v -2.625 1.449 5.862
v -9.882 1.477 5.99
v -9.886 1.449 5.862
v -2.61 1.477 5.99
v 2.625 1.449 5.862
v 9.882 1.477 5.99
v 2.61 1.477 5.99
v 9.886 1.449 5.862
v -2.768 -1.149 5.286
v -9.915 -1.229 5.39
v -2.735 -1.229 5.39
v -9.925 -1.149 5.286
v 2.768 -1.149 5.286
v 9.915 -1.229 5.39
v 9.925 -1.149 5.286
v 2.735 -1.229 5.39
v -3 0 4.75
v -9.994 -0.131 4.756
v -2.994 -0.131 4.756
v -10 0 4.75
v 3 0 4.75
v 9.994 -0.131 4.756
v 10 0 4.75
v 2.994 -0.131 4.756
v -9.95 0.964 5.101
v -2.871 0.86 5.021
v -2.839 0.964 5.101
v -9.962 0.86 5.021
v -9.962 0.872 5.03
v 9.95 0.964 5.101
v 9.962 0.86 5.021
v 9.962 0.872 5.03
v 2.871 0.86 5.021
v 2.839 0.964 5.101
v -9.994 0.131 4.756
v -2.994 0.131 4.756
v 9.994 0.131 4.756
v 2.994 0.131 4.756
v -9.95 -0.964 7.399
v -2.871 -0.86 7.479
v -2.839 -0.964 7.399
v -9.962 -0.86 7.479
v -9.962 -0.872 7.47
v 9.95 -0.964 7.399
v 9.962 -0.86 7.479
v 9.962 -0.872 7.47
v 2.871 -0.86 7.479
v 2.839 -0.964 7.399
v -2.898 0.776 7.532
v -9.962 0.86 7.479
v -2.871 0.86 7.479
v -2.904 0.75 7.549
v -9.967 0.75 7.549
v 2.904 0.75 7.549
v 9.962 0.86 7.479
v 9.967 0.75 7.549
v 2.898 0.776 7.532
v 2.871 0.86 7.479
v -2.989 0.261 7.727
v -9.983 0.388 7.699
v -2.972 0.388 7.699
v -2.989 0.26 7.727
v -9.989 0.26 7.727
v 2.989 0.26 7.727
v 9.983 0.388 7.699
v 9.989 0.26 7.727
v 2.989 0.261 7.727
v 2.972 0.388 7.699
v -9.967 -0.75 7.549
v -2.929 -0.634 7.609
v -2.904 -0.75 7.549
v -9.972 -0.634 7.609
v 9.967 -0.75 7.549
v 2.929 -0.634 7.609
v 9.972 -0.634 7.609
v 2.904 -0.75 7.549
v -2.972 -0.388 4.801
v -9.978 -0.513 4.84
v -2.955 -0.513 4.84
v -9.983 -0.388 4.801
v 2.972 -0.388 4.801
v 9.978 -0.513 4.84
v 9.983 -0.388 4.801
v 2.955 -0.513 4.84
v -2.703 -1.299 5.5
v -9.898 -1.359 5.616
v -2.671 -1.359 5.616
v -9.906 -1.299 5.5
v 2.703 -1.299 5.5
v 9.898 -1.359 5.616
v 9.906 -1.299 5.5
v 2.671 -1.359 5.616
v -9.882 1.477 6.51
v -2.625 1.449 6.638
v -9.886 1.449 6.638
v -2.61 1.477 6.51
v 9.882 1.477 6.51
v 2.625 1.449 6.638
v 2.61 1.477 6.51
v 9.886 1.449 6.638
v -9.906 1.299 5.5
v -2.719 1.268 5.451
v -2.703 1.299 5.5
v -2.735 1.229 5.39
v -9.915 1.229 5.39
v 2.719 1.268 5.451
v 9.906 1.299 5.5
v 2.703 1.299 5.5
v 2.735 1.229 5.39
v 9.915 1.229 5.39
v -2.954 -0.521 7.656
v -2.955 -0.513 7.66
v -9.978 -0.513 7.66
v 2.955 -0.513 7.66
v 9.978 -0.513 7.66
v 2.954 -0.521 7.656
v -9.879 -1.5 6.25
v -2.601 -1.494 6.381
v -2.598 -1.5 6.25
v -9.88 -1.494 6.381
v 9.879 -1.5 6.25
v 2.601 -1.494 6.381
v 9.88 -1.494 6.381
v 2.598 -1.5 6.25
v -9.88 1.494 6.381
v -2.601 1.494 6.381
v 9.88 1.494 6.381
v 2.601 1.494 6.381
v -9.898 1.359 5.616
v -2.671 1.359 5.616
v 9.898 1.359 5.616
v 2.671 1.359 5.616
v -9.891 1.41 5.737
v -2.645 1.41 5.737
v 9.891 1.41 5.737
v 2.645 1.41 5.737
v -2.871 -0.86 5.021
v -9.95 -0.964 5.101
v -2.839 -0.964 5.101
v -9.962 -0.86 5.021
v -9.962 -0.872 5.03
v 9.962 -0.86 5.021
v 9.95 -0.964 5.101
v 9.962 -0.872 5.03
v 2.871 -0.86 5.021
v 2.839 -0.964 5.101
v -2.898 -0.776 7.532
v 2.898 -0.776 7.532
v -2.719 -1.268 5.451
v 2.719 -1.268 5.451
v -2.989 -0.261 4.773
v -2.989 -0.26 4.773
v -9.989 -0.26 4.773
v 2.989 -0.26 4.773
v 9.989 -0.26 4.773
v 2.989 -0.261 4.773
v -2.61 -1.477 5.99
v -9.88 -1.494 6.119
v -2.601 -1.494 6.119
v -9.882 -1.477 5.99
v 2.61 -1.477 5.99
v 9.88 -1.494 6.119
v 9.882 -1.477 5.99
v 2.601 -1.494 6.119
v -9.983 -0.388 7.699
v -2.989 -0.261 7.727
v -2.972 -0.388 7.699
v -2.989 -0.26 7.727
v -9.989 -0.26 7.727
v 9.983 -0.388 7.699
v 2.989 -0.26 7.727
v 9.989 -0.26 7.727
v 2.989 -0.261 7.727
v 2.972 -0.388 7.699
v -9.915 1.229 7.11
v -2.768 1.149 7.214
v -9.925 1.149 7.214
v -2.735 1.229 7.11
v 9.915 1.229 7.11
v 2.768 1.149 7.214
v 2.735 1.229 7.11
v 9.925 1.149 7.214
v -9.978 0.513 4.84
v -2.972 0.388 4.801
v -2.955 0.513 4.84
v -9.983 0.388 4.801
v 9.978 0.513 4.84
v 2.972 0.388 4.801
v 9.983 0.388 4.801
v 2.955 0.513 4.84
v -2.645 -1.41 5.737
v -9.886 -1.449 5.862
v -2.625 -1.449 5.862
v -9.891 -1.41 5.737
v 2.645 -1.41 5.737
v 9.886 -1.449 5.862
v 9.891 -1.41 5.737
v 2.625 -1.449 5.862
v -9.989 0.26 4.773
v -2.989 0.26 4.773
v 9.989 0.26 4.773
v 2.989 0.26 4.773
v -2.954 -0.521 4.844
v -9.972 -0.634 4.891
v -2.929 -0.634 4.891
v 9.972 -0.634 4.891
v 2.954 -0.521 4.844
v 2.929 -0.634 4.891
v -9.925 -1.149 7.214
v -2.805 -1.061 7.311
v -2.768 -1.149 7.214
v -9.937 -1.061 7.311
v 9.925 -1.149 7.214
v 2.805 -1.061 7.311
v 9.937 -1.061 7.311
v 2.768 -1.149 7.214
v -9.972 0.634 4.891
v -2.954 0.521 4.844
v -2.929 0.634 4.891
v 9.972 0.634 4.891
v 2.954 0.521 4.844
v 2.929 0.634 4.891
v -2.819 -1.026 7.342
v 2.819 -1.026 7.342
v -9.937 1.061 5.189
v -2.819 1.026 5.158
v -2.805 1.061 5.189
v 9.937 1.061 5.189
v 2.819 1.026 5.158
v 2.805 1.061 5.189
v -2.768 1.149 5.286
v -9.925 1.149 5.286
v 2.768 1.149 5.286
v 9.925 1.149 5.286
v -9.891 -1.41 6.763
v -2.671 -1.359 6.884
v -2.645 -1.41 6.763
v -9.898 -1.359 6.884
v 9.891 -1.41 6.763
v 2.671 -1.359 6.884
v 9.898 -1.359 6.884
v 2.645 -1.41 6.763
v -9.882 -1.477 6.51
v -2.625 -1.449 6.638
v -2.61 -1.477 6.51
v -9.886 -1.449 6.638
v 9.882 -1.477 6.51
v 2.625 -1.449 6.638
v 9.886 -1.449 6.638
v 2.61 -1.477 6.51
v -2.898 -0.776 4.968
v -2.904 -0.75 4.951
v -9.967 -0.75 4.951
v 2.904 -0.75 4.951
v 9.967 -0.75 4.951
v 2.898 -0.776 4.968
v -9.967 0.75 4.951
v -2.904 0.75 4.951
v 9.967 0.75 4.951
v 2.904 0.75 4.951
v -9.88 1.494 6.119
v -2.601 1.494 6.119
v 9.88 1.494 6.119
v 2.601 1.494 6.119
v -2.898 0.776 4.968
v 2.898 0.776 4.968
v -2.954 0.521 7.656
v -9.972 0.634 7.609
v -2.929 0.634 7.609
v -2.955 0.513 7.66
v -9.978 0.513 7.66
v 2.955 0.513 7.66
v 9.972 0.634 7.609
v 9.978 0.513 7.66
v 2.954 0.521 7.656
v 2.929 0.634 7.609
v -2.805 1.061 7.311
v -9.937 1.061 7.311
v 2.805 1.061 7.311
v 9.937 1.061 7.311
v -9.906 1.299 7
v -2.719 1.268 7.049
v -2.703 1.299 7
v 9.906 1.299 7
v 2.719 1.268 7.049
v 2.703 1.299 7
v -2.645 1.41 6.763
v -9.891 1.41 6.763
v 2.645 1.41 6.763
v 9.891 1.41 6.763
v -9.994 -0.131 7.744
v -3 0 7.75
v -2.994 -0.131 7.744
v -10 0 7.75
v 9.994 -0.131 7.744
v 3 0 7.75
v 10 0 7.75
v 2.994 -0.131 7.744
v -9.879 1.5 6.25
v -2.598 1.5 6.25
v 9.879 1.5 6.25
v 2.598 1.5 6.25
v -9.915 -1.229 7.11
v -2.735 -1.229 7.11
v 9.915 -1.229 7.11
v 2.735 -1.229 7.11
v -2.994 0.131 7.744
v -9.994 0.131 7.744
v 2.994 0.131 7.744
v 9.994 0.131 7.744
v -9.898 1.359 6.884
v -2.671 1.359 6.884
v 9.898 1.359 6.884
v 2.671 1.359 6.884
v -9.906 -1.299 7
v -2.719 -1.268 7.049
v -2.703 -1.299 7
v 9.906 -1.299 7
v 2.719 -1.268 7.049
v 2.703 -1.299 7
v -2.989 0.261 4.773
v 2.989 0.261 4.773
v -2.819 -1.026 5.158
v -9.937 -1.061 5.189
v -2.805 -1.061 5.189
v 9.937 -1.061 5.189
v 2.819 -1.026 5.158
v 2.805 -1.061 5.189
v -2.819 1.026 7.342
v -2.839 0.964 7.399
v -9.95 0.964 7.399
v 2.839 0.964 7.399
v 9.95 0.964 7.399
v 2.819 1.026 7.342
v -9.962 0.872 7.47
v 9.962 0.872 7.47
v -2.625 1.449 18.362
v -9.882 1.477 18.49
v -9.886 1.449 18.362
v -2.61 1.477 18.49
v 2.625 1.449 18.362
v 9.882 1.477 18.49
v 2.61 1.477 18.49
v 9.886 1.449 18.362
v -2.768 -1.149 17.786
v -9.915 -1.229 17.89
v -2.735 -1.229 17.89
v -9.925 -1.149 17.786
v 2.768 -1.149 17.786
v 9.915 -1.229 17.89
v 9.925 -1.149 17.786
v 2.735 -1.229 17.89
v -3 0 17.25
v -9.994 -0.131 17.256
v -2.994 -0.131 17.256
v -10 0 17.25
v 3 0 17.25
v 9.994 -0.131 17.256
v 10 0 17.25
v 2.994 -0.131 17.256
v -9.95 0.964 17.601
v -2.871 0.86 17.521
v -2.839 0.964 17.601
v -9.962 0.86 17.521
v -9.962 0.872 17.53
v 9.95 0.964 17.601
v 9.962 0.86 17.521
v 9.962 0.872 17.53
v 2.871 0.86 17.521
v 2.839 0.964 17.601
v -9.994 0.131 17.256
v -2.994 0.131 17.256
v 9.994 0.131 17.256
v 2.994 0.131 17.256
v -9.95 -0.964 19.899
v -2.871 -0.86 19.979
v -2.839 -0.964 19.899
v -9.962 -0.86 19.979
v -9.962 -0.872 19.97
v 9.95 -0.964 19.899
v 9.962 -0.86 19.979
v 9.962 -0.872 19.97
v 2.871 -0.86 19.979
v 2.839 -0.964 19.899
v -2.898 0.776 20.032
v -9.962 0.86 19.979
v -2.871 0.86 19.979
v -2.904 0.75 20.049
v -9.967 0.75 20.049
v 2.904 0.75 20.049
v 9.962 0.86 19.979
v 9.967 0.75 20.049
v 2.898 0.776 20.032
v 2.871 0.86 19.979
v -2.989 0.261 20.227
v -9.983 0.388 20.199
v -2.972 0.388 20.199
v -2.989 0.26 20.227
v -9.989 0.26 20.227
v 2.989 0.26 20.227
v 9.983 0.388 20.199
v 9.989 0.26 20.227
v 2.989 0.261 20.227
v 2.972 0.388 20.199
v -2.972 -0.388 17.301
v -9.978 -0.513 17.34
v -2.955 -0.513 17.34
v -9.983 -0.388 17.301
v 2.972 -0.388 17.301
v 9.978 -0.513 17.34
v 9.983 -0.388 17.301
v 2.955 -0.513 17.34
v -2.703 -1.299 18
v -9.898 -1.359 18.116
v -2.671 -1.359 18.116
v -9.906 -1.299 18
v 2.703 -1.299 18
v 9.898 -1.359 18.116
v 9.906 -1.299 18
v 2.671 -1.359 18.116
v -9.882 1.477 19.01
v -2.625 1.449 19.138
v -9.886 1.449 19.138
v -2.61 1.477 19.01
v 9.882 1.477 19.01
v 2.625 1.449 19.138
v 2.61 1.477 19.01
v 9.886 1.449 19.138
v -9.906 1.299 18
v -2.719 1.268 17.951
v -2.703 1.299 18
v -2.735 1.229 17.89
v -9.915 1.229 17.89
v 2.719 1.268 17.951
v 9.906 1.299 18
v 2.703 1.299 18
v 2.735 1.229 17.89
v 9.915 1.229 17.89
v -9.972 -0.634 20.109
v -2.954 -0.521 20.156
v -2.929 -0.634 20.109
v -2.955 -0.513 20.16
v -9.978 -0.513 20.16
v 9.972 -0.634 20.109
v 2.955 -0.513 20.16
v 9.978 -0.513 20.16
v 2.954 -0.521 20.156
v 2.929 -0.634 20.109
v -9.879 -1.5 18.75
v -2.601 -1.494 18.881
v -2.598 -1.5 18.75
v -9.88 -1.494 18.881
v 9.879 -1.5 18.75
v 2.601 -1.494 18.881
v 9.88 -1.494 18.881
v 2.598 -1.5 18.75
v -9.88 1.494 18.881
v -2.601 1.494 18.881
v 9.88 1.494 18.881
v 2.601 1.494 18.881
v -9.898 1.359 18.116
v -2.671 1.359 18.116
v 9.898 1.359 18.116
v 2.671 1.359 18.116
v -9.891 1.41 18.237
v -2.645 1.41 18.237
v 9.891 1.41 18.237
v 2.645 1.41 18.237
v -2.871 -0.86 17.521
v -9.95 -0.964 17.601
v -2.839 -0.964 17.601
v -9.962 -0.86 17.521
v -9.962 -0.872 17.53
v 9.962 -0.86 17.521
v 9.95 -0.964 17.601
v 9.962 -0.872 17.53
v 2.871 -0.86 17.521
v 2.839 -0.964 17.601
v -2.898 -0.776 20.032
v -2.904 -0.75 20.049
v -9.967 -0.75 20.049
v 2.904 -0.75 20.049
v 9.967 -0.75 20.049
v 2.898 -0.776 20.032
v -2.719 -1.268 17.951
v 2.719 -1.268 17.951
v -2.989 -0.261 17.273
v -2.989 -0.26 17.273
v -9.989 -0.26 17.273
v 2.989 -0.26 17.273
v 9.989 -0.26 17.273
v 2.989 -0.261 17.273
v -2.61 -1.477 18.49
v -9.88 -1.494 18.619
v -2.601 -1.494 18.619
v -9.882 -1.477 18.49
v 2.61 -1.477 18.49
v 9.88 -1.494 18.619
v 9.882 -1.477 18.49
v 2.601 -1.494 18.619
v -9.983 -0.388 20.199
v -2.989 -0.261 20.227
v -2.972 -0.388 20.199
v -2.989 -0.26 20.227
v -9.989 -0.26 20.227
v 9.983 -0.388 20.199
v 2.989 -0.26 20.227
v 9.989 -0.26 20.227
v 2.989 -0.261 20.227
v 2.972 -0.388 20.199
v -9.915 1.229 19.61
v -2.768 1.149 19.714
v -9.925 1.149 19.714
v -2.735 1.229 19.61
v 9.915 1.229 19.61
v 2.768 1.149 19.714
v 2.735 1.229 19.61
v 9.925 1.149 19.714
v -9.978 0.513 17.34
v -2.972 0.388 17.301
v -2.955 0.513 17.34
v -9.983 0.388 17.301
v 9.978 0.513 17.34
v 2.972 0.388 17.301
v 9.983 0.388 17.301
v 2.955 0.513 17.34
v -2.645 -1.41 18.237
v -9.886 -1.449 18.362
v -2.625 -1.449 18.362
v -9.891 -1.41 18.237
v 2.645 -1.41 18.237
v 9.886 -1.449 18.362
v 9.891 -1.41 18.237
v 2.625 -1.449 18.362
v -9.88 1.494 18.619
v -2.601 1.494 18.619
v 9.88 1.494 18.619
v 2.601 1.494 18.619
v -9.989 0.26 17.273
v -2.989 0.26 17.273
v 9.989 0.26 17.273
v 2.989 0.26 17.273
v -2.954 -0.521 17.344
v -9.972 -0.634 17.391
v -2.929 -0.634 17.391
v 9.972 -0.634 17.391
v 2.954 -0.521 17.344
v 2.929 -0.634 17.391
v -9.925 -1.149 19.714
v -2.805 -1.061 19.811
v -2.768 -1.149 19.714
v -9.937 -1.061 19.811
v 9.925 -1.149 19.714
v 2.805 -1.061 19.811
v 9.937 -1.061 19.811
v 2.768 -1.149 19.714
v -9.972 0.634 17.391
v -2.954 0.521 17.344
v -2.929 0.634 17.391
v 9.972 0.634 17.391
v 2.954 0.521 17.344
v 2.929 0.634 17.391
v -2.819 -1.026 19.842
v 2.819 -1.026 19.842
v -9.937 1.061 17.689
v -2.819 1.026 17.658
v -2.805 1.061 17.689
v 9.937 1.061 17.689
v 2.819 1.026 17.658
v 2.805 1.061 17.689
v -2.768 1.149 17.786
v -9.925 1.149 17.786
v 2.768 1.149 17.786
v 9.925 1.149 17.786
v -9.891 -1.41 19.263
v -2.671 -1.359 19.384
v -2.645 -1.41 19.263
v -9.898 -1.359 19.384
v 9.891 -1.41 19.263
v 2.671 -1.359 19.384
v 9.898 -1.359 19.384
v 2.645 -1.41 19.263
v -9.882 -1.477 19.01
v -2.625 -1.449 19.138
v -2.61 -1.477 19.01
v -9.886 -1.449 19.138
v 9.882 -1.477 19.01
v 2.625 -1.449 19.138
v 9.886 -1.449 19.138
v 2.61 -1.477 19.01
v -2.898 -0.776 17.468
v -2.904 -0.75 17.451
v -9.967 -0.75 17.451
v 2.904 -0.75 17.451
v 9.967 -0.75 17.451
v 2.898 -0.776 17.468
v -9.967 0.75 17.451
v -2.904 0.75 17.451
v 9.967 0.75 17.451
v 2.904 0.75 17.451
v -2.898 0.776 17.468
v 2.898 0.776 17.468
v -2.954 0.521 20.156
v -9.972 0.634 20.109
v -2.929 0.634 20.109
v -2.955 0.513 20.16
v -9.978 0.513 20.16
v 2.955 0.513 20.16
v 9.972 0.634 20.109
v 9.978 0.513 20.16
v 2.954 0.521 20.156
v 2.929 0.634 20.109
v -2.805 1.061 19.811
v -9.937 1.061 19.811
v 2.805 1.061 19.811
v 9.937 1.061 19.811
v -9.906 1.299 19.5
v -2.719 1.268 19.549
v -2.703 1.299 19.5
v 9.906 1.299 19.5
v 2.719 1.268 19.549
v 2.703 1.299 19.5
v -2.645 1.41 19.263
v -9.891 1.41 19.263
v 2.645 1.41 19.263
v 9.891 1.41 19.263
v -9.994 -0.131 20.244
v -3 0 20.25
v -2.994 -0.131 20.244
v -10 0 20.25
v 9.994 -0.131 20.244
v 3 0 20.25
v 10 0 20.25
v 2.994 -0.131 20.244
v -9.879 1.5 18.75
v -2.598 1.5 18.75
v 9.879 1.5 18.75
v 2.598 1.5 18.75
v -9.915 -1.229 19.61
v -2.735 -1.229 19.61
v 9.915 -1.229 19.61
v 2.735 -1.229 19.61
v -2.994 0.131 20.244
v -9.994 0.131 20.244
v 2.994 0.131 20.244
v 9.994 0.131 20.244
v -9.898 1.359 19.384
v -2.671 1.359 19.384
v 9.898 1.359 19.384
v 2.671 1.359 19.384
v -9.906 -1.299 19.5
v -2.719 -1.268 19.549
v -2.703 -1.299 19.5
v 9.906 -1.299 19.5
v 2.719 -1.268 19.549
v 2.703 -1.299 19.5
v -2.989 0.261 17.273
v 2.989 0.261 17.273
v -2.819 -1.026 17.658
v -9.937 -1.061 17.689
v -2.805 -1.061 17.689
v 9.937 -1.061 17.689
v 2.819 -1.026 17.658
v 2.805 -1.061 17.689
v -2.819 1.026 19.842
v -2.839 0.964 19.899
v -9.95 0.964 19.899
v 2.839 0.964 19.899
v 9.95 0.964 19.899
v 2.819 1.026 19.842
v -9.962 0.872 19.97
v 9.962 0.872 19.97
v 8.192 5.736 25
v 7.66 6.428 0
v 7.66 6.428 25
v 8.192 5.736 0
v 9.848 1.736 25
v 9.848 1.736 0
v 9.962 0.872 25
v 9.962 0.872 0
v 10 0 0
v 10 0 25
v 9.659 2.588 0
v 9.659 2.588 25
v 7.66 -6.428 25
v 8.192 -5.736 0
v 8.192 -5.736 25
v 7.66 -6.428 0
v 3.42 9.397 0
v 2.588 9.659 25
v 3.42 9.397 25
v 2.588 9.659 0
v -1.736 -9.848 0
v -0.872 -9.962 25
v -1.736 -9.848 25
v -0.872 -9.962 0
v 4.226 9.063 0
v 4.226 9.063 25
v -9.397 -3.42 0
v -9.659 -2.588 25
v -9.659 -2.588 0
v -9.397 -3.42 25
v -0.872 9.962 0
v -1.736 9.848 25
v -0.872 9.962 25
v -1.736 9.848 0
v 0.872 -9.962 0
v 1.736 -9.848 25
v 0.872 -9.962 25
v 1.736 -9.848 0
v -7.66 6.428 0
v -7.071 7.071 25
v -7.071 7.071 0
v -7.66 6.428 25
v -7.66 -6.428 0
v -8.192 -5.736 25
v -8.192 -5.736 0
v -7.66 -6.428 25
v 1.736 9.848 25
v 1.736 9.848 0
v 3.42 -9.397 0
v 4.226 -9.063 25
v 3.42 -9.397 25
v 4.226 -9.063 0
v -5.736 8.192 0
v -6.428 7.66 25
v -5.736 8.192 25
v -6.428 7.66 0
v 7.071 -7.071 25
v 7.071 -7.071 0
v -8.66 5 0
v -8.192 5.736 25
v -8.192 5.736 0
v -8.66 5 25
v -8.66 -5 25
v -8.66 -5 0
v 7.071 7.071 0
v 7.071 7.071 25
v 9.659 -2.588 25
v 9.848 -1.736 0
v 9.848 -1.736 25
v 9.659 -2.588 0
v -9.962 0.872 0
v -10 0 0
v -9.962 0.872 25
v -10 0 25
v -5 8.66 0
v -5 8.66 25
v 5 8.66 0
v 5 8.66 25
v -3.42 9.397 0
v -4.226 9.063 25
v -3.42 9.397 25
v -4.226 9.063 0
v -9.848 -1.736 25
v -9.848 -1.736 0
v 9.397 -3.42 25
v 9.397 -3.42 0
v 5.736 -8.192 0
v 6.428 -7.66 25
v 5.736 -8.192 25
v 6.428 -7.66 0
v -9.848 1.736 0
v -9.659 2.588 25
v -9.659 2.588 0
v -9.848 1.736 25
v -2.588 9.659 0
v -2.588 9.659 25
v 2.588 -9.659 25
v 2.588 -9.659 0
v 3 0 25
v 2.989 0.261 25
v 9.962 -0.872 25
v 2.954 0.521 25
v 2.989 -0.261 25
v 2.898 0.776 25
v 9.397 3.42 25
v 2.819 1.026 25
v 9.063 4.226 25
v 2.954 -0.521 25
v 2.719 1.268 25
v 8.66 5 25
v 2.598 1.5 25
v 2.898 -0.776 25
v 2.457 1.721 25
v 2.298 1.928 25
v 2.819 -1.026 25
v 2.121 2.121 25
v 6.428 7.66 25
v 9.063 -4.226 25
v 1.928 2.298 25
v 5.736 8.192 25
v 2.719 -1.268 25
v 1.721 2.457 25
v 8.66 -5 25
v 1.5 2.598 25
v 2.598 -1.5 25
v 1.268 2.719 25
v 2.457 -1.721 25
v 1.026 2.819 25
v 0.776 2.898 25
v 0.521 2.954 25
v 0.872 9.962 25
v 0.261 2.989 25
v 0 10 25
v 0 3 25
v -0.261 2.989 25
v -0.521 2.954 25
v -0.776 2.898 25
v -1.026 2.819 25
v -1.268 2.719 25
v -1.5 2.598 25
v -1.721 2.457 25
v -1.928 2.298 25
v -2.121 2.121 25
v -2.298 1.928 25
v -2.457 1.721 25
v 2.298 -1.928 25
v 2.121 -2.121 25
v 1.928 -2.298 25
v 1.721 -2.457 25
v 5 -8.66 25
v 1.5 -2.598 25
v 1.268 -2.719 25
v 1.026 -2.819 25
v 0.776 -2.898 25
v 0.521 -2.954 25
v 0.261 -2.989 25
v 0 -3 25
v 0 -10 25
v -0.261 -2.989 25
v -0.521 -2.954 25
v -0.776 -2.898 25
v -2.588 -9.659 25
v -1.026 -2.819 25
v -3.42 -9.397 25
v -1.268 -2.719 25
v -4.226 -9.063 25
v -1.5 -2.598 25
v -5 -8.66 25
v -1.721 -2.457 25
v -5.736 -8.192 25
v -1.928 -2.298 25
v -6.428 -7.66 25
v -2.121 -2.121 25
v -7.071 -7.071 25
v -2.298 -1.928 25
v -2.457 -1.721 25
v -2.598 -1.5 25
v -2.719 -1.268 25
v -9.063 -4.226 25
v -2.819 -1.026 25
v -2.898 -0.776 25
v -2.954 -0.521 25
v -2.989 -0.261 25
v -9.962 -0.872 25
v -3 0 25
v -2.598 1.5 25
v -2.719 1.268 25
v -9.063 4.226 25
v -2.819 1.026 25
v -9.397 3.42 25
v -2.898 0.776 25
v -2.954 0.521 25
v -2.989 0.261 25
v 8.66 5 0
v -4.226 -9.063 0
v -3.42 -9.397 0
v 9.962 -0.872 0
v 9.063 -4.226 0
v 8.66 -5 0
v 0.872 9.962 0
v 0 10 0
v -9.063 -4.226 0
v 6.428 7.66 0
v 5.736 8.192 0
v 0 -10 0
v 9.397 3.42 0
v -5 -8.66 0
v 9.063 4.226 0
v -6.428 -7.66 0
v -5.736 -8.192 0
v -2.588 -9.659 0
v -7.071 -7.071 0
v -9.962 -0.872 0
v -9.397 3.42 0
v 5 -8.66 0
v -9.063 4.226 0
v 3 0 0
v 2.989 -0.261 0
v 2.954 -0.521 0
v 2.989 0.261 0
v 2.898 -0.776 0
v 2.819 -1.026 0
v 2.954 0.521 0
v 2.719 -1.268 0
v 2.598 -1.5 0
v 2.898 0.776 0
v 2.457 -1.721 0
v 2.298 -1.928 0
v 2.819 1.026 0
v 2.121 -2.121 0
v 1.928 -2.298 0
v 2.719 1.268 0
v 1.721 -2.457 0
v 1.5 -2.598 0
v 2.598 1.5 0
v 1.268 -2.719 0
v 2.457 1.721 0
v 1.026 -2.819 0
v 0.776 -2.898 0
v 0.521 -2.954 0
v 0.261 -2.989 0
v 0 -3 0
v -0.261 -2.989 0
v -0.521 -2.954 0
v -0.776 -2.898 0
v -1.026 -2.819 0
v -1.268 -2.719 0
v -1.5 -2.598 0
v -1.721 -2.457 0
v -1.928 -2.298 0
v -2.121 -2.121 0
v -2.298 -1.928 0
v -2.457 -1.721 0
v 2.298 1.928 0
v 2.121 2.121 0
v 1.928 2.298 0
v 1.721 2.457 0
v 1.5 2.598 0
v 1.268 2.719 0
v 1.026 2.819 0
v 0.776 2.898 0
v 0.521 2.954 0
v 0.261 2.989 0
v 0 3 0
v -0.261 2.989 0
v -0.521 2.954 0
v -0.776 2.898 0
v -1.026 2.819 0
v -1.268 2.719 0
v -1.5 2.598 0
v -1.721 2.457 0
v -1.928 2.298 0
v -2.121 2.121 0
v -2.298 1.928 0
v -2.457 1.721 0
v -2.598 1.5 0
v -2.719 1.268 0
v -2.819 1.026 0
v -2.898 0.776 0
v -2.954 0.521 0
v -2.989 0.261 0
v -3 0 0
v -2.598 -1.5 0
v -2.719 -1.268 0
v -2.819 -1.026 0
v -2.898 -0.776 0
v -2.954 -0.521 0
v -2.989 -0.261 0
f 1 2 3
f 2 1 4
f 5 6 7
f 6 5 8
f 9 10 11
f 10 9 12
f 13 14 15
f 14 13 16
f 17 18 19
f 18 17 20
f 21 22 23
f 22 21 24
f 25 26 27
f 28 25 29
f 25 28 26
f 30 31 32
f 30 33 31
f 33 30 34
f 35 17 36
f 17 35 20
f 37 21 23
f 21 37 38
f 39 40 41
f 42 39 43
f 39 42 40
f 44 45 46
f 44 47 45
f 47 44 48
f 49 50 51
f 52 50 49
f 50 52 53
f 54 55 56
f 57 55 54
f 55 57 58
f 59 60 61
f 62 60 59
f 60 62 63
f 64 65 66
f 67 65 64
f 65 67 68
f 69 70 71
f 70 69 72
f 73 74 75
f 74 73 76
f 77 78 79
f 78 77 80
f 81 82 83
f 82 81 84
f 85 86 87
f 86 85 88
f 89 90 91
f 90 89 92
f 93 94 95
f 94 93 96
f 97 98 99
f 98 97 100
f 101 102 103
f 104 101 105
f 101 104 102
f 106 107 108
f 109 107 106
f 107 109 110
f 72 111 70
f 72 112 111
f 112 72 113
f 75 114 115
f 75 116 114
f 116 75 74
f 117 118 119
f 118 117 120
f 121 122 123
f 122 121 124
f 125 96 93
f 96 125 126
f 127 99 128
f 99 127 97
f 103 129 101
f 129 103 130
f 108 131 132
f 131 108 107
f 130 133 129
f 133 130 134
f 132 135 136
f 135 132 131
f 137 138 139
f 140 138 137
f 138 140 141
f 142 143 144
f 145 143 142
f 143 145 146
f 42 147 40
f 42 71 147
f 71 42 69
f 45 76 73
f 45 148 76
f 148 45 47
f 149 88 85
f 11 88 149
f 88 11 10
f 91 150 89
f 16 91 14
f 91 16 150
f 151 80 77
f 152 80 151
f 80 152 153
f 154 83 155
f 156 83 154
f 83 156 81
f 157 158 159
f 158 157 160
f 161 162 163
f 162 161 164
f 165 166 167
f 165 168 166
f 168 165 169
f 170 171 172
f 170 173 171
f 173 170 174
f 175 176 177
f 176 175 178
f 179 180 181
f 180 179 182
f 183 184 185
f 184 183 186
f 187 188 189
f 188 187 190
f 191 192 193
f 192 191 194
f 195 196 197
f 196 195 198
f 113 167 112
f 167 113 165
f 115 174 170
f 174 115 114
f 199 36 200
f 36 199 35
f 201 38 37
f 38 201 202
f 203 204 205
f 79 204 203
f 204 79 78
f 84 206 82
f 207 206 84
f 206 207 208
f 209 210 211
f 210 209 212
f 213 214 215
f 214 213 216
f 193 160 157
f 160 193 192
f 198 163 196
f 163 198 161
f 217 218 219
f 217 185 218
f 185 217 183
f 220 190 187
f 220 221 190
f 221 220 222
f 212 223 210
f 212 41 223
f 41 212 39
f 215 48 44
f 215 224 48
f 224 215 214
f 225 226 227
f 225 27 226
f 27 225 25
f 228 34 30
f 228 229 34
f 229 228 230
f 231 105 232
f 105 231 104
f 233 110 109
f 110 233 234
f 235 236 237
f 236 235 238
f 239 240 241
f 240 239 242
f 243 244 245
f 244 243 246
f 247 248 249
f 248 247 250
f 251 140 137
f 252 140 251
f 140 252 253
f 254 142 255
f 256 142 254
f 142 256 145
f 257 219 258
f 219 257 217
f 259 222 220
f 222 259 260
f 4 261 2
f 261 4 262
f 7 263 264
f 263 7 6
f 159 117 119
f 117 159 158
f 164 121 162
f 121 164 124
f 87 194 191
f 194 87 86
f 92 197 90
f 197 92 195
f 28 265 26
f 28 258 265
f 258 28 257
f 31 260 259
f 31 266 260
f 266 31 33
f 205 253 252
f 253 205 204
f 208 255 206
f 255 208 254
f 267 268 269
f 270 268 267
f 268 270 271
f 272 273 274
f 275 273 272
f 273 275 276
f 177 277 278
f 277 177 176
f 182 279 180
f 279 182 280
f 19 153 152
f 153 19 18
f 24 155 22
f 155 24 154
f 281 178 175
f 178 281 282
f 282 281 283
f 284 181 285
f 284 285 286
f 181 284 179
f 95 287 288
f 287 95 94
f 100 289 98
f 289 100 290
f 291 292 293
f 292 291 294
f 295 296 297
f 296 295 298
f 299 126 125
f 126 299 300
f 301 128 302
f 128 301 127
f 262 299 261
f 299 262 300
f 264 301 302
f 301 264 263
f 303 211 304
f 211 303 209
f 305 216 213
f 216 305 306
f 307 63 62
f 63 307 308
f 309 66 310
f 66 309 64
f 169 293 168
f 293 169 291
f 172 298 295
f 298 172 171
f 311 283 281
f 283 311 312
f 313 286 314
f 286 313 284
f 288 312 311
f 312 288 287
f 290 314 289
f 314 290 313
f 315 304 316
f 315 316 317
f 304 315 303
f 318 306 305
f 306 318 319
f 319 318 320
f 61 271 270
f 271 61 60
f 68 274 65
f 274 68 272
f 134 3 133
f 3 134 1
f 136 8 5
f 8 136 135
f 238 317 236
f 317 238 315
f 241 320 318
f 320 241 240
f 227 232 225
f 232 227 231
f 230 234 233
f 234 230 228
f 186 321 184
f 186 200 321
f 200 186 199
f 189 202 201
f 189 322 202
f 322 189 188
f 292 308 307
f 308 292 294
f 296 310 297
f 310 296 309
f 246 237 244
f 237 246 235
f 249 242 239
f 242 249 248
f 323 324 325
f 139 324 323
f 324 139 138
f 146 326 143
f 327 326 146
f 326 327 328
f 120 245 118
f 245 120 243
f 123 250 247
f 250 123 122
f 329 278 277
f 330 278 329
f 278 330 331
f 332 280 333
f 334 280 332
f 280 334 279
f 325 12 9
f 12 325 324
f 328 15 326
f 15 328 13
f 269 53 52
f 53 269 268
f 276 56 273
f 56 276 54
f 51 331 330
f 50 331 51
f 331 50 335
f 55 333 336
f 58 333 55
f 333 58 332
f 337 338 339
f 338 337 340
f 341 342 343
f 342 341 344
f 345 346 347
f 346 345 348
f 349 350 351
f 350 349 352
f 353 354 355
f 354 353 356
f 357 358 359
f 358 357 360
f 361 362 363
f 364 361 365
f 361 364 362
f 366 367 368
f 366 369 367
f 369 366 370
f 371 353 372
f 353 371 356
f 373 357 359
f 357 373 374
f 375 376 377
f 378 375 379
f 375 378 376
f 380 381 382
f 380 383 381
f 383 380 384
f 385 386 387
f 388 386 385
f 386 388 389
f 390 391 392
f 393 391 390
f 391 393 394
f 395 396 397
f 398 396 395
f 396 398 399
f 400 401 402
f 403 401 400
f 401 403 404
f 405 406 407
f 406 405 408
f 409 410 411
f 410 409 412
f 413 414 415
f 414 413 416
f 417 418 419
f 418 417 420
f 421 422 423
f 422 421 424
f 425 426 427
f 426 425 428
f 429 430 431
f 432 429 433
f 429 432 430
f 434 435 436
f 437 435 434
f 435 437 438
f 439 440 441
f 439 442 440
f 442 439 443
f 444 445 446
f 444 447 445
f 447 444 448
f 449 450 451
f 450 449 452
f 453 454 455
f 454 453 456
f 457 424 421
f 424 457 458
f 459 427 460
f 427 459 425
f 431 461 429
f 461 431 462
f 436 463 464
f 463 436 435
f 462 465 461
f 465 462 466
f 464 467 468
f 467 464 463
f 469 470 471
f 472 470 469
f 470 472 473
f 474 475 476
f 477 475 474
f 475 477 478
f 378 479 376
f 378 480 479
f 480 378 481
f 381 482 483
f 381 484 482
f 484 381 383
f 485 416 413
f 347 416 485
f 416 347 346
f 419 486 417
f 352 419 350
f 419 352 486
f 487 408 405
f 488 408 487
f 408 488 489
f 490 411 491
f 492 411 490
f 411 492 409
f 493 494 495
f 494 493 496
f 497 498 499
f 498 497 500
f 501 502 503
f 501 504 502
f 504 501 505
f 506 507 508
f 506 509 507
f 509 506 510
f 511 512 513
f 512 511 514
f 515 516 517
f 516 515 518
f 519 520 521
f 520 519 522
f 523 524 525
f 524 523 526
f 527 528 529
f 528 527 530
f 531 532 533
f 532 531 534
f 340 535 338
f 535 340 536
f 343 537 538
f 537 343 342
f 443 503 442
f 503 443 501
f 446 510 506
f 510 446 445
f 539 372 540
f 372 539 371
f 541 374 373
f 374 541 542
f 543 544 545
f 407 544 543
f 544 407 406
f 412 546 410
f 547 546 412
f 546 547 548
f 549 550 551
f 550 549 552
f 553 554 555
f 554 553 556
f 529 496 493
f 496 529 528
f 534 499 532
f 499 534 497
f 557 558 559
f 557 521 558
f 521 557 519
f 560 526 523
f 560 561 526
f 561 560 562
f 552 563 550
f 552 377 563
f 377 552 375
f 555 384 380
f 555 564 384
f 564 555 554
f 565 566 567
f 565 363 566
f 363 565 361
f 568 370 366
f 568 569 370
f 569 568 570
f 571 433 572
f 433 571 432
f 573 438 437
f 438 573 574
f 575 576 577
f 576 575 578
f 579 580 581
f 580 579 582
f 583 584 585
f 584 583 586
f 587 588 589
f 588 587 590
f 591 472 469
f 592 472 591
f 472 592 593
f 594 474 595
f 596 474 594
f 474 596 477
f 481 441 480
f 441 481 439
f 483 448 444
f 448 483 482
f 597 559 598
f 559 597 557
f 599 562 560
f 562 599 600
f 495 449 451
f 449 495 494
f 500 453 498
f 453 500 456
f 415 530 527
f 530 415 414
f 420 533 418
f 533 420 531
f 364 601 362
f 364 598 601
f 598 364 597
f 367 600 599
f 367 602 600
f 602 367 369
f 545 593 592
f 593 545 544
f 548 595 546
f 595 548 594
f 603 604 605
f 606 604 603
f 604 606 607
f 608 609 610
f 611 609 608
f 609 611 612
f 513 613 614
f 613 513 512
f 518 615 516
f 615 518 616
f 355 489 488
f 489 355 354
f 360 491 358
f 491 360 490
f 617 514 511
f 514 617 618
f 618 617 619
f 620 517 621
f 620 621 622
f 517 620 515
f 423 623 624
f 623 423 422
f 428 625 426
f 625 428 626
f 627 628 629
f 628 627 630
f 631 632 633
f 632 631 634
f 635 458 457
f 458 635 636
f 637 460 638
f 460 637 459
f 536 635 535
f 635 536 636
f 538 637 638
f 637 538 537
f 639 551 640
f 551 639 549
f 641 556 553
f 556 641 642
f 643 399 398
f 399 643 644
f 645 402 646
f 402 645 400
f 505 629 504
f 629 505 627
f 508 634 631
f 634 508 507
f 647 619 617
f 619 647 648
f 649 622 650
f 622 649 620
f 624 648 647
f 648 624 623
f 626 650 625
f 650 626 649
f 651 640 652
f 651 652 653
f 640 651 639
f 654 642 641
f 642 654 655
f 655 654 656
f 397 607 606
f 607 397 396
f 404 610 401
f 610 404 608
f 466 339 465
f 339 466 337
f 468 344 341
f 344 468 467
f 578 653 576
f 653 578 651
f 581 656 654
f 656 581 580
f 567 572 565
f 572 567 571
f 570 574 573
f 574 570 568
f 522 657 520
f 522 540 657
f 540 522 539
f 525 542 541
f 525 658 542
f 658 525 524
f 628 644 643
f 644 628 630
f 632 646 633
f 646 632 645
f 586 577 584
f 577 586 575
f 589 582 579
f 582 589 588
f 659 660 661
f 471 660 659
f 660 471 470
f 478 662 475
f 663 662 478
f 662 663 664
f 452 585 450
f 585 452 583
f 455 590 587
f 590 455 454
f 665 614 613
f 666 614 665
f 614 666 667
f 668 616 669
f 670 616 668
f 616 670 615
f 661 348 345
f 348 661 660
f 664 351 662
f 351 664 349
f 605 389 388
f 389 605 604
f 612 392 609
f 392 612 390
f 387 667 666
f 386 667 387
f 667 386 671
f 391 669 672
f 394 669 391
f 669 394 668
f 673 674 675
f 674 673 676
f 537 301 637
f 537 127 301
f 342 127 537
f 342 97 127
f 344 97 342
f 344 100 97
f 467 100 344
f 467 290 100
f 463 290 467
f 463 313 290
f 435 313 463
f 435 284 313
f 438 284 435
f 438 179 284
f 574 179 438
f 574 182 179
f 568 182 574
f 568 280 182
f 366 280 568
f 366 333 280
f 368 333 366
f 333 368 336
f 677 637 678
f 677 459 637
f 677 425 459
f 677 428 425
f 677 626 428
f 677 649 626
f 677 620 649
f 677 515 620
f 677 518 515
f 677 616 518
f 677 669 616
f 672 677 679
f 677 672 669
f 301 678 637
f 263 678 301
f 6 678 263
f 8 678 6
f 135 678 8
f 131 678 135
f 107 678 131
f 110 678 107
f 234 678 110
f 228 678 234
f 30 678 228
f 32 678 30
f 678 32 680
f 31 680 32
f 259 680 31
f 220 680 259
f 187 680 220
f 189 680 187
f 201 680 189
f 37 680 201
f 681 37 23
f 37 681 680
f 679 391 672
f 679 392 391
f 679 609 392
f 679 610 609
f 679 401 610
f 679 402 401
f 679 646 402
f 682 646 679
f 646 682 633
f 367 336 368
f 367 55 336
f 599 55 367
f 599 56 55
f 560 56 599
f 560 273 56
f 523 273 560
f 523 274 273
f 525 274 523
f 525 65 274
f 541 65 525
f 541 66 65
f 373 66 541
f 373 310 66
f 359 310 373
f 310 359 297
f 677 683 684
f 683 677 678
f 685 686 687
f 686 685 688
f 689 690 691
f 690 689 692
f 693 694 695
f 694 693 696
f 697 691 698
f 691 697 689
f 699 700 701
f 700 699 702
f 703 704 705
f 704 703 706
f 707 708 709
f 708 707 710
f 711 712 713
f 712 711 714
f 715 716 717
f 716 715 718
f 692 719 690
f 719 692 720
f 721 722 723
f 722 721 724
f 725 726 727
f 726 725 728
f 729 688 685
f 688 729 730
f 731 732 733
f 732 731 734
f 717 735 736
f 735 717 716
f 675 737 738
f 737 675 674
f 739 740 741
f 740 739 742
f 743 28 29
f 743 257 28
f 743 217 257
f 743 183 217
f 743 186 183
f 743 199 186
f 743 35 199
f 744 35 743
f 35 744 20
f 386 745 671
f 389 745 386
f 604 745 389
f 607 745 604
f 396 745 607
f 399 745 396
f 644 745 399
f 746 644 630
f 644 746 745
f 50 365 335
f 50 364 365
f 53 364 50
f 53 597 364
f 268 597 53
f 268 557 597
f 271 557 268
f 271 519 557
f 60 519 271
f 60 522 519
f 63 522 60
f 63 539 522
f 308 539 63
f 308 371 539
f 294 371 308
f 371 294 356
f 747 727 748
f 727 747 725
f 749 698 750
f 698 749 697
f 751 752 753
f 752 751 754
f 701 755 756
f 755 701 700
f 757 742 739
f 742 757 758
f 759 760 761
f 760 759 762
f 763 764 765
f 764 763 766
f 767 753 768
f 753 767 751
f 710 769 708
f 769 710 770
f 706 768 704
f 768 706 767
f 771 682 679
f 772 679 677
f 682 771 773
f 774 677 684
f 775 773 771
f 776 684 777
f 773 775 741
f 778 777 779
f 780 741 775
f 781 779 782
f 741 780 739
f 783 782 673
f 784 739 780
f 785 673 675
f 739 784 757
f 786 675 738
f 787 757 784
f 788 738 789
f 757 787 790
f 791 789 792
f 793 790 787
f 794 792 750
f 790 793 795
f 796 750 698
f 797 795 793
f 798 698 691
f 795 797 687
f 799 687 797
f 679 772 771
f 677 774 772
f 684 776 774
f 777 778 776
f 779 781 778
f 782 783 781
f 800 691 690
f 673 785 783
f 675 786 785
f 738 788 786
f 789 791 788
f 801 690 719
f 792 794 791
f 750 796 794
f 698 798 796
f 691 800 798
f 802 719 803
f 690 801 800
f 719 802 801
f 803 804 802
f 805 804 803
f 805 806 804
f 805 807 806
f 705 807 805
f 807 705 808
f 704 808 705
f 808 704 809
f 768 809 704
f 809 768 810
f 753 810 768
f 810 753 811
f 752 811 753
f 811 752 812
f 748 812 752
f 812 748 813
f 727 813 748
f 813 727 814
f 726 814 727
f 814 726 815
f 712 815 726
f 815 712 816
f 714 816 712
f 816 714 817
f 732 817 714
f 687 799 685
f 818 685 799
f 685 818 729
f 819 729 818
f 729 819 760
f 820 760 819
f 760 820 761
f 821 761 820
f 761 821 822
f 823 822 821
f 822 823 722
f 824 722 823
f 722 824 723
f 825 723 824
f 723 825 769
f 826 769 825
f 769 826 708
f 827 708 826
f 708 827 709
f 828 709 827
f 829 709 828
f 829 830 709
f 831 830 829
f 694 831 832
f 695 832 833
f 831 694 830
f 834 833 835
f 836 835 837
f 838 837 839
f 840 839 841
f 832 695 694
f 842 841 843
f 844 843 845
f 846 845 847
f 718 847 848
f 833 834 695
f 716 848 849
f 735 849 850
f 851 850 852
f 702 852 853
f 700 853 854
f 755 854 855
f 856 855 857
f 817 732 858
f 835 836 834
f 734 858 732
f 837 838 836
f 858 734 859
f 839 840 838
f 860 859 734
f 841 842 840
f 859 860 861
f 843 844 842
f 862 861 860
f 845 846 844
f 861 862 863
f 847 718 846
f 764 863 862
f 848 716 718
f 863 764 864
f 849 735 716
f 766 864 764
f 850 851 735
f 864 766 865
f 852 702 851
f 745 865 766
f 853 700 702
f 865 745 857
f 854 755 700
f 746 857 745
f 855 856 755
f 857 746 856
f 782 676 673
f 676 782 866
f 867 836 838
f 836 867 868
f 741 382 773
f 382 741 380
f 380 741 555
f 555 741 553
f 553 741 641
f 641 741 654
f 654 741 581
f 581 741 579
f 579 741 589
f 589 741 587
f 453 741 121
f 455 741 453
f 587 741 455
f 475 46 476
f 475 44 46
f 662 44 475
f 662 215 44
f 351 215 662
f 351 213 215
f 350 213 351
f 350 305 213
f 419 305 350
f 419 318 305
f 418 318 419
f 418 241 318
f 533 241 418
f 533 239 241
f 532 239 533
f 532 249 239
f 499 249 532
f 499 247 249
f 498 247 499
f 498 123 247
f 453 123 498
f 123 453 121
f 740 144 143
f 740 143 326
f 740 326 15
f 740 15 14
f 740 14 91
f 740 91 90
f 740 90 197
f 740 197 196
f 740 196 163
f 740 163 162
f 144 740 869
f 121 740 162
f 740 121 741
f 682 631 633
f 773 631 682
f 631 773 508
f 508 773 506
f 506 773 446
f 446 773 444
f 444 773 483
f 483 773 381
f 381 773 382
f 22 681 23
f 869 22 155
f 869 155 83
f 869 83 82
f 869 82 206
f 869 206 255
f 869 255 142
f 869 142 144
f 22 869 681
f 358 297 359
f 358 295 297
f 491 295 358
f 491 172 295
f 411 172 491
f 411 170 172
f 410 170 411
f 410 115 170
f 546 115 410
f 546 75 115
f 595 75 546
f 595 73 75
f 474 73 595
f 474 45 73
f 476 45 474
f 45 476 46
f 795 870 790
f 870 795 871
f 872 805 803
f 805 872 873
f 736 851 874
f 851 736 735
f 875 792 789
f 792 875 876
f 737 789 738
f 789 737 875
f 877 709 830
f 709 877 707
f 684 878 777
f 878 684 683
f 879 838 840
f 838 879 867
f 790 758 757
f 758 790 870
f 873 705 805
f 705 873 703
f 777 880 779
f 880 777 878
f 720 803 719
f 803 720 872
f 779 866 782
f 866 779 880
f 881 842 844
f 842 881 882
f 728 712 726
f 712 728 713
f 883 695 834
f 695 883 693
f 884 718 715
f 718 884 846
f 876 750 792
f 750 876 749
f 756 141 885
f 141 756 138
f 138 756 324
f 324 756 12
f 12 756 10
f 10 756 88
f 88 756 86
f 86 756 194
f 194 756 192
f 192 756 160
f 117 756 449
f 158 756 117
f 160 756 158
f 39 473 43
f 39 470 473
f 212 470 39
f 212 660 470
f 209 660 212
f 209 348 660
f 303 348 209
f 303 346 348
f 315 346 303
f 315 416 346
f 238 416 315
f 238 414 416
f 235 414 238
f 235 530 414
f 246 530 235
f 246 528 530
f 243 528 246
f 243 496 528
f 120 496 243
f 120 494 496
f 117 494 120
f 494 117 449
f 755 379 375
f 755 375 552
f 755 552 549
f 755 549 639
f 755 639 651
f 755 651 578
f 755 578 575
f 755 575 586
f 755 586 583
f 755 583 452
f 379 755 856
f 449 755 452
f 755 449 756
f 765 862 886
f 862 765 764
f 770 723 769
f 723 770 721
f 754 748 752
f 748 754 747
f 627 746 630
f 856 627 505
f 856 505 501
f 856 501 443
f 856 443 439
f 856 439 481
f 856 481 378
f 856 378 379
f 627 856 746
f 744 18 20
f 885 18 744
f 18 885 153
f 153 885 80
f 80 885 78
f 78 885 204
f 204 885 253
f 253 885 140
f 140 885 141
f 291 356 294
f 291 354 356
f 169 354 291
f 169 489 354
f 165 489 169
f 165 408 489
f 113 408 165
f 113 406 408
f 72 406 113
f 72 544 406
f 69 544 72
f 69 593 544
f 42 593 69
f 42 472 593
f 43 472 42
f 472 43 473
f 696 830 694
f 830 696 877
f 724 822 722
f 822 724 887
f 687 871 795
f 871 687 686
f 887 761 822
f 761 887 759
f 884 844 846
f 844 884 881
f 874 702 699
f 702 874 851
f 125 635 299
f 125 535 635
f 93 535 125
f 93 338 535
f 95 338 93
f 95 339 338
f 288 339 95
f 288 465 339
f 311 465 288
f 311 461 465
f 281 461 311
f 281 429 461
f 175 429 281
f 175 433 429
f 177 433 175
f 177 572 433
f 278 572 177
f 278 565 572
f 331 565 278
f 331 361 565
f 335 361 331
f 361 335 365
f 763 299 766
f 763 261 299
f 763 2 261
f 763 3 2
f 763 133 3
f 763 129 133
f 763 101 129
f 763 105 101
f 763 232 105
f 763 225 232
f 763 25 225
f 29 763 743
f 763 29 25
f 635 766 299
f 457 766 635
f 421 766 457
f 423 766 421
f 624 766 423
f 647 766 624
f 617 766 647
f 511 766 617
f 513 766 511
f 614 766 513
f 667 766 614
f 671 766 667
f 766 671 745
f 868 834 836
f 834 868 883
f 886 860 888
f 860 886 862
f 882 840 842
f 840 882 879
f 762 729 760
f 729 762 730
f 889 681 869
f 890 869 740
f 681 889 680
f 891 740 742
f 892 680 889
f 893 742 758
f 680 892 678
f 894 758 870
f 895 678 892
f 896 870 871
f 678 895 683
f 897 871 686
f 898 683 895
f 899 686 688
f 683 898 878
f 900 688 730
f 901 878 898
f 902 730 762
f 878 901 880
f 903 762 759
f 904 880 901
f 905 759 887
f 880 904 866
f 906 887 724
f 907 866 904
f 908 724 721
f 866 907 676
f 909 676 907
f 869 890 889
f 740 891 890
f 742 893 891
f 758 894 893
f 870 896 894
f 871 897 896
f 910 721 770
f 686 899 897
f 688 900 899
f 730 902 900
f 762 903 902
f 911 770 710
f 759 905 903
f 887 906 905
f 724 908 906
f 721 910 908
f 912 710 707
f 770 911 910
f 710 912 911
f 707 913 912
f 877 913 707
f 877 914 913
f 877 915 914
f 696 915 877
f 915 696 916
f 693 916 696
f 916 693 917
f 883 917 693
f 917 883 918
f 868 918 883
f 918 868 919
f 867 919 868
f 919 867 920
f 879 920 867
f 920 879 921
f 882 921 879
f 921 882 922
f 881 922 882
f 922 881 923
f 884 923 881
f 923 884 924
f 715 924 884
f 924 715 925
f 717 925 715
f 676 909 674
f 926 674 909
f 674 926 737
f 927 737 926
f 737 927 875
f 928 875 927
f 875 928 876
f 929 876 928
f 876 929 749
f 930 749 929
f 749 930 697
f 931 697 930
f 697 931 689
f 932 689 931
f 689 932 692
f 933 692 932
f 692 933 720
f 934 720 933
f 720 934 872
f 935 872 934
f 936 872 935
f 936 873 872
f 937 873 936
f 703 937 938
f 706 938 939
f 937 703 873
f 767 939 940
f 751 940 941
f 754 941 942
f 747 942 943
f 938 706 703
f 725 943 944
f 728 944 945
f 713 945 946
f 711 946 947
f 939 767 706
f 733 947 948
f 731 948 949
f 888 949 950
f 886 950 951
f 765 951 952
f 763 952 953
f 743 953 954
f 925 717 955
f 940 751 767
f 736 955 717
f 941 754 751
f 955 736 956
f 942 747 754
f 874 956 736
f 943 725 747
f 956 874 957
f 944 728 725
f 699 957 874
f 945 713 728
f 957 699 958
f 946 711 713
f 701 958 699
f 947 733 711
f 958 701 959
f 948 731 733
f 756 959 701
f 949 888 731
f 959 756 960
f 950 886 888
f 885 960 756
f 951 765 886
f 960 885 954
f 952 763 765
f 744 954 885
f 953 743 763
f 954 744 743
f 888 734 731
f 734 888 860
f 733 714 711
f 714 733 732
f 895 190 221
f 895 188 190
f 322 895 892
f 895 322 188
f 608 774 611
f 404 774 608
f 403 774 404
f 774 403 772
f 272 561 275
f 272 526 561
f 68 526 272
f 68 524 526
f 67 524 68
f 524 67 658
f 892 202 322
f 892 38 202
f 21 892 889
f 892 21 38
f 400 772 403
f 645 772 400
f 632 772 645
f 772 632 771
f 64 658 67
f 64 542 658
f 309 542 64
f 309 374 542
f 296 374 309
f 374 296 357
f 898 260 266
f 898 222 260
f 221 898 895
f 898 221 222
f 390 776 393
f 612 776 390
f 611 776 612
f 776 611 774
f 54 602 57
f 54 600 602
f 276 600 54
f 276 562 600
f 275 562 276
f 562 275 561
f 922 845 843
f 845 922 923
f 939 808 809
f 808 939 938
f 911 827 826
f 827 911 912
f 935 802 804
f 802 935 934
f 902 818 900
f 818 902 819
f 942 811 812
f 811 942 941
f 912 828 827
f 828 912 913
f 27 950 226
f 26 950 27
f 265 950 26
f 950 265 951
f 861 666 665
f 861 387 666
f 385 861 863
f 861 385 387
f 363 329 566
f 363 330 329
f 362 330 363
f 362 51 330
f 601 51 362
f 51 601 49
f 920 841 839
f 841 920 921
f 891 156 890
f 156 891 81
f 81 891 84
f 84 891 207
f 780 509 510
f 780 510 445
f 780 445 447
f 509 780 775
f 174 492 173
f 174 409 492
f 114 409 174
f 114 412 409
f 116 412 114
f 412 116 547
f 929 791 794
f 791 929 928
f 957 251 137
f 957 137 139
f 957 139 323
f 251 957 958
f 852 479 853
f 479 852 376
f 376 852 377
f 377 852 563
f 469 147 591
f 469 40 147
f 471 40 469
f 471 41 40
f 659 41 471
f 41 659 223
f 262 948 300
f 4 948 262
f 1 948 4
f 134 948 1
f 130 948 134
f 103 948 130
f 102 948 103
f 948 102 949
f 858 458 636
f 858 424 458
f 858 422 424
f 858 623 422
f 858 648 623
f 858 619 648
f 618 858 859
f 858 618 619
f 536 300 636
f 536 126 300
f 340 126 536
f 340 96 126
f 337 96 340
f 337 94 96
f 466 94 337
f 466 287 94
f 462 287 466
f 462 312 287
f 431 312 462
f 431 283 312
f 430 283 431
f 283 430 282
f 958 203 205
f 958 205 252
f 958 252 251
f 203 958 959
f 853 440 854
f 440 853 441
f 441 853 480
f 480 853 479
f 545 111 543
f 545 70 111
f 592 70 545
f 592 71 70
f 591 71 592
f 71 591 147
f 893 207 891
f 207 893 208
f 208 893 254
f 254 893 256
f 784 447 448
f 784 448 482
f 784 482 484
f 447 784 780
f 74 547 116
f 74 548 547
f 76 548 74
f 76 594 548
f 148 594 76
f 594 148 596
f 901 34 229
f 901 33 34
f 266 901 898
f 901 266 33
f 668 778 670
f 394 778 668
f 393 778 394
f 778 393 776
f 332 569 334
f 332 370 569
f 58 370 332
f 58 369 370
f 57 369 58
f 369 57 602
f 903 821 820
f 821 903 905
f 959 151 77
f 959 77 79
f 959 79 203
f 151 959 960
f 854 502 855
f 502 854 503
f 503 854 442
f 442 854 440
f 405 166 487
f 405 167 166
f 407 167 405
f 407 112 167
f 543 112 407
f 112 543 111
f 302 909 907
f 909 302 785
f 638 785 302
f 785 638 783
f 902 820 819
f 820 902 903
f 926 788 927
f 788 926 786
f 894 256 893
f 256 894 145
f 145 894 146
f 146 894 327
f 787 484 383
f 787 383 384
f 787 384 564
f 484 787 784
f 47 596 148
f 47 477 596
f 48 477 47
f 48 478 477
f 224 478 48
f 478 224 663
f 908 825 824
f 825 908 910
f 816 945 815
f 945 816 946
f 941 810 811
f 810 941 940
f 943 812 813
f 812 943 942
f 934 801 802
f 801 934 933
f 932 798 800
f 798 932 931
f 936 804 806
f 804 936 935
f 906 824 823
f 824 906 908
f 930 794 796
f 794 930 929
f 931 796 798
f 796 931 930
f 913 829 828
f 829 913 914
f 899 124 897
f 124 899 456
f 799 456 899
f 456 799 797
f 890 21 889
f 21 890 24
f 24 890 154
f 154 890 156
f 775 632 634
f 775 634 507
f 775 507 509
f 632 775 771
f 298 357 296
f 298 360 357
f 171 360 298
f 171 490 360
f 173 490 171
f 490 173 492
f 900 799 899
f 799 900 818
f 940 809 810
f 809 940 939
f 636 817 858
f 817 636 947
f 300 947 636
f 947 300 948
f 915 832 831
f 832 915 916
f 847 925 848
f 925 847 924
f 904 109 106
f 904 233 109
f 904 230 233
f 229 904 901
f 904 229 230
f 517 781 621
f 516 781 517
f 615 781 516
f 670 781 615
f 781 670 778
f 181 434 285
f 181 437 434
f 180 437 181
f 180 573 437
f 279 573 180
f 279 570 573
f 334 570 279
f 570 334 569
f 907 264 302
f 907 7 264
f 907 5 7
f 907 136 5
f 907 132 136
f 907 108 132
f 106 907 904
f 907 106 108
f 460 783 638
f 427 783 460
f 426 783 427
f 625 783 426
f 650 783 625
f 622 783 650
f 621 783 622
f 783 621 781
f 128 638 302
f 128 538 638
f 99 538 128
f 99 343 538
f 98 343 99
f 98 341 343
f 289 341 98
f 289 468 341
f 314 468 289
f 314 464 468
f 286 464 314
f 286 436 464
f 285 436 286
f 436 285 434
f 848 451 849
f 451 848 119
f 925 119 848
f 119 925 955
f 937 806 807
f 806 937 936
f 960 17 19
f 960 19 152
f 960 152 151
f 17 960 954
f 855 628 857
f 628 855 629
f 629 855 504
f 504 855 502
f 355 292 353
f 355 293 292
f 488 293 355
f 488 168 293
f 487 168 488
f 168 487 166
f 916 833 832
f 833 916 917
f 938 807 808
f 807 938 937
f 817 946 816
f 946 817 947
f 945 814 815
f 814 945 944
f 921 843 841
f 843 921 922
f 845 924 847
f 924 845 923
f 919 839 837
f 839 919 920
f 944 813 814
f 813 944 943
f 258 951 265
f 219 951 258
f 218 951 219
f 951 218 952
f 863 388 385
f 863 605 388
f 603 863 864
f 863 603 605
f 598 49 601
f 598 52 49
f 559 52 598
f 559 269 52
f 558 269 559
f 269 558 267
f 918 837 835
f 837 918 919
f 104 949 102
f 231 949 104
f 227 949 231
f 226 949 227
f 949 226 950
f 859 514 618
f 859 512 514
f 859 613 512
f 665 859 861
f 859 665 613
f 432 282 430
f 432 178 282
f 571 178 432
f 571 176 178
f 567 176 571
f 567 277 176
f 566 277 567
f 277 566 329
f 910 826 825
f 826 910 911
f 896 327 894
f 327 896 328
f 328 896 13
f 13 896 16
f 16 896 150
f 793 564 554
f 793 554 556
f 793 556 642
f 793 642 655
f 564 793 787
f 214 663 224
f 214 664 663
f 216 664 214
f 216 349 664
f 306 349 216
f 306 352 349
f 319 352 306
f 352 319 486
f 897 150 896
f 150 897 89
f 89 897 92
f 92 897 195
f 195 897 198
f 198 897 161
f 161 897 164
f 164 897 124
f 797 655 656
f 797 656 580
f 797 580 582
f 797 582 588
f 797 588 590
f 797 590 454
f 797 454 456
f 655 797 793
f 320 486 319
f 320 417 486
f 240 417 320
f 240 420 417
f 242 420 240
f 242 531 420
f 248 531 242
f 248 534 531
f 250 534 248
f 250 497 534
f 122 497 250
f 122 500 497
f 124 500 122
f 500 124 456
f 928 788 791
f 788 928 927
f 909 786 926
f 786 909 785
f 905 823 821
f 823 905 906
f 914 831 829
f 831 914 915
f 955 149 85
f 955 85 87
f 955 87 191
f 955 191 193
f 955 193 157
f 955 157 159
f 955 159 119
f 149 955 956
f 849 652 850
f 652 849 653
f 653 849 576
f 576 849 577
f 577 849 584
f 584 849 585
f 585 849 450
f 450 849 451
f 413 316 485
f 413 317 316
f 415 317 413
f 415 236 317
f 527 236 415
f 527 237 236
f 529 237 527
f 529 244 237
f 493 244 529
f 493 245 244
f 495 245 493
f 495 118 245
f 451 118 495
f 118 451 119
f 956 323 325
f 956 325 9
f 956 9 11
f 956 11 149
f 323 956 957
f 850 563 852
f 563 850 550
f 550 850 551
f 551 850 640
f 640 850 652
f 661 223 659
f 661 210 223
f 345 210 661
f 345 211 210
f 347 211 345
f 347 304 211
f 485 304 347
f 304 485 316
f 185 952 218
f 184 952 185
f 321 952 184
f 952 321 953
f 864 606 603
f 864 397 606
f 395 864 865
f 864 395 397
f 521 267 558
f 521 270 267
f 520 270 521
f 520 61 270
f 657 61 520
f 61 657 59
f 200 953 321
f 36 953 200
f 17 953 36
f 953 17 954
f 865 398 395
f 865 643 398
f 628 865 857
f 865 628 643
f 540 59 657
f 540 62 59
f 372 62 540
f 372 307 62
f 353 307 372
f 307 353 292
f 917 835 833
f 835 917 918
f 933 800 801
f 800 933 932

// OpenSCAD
// Rigid shaft coupler - a cylinder with an axial bore that joins two shafts end to end,
// held by radial set screws. NOVEL general mechanical part.
//
// @desc rigid shaft coupler joining two shafts end to end with set screws
// @prompt Design a rigid shaft coupler in OpenSCAD: a cylinder {od} mm in outer diameter and {length} mm long with a {bore} mm axial bore to join two shafts, and two radial set-screw holes {set_d} mm. Reply with a single complete OpenSCAD file.
// @param od      outer diameter, mm         [12:40]
// @param length  length, mm                 [16:50]
// @param bore    shaft bore diameter, mm     [3:20]
// @param set_d   set-screw diameter, mm      [2:6]

od     = 20;
length = 25;
bore   = 6;
set_d  = 3;

$fn = 72;

difference() {
    cylinder(h = length, d = od);
    translate([0, 0, -1]) cylinder(h = length + 2, d = bore);
    for (z = [length * 0.25, length * 0.75])
        translate([0, 0, z]) rotate([0, 90, 0]) cylinder(h = od + 2, d = set_d, center = true);
}
